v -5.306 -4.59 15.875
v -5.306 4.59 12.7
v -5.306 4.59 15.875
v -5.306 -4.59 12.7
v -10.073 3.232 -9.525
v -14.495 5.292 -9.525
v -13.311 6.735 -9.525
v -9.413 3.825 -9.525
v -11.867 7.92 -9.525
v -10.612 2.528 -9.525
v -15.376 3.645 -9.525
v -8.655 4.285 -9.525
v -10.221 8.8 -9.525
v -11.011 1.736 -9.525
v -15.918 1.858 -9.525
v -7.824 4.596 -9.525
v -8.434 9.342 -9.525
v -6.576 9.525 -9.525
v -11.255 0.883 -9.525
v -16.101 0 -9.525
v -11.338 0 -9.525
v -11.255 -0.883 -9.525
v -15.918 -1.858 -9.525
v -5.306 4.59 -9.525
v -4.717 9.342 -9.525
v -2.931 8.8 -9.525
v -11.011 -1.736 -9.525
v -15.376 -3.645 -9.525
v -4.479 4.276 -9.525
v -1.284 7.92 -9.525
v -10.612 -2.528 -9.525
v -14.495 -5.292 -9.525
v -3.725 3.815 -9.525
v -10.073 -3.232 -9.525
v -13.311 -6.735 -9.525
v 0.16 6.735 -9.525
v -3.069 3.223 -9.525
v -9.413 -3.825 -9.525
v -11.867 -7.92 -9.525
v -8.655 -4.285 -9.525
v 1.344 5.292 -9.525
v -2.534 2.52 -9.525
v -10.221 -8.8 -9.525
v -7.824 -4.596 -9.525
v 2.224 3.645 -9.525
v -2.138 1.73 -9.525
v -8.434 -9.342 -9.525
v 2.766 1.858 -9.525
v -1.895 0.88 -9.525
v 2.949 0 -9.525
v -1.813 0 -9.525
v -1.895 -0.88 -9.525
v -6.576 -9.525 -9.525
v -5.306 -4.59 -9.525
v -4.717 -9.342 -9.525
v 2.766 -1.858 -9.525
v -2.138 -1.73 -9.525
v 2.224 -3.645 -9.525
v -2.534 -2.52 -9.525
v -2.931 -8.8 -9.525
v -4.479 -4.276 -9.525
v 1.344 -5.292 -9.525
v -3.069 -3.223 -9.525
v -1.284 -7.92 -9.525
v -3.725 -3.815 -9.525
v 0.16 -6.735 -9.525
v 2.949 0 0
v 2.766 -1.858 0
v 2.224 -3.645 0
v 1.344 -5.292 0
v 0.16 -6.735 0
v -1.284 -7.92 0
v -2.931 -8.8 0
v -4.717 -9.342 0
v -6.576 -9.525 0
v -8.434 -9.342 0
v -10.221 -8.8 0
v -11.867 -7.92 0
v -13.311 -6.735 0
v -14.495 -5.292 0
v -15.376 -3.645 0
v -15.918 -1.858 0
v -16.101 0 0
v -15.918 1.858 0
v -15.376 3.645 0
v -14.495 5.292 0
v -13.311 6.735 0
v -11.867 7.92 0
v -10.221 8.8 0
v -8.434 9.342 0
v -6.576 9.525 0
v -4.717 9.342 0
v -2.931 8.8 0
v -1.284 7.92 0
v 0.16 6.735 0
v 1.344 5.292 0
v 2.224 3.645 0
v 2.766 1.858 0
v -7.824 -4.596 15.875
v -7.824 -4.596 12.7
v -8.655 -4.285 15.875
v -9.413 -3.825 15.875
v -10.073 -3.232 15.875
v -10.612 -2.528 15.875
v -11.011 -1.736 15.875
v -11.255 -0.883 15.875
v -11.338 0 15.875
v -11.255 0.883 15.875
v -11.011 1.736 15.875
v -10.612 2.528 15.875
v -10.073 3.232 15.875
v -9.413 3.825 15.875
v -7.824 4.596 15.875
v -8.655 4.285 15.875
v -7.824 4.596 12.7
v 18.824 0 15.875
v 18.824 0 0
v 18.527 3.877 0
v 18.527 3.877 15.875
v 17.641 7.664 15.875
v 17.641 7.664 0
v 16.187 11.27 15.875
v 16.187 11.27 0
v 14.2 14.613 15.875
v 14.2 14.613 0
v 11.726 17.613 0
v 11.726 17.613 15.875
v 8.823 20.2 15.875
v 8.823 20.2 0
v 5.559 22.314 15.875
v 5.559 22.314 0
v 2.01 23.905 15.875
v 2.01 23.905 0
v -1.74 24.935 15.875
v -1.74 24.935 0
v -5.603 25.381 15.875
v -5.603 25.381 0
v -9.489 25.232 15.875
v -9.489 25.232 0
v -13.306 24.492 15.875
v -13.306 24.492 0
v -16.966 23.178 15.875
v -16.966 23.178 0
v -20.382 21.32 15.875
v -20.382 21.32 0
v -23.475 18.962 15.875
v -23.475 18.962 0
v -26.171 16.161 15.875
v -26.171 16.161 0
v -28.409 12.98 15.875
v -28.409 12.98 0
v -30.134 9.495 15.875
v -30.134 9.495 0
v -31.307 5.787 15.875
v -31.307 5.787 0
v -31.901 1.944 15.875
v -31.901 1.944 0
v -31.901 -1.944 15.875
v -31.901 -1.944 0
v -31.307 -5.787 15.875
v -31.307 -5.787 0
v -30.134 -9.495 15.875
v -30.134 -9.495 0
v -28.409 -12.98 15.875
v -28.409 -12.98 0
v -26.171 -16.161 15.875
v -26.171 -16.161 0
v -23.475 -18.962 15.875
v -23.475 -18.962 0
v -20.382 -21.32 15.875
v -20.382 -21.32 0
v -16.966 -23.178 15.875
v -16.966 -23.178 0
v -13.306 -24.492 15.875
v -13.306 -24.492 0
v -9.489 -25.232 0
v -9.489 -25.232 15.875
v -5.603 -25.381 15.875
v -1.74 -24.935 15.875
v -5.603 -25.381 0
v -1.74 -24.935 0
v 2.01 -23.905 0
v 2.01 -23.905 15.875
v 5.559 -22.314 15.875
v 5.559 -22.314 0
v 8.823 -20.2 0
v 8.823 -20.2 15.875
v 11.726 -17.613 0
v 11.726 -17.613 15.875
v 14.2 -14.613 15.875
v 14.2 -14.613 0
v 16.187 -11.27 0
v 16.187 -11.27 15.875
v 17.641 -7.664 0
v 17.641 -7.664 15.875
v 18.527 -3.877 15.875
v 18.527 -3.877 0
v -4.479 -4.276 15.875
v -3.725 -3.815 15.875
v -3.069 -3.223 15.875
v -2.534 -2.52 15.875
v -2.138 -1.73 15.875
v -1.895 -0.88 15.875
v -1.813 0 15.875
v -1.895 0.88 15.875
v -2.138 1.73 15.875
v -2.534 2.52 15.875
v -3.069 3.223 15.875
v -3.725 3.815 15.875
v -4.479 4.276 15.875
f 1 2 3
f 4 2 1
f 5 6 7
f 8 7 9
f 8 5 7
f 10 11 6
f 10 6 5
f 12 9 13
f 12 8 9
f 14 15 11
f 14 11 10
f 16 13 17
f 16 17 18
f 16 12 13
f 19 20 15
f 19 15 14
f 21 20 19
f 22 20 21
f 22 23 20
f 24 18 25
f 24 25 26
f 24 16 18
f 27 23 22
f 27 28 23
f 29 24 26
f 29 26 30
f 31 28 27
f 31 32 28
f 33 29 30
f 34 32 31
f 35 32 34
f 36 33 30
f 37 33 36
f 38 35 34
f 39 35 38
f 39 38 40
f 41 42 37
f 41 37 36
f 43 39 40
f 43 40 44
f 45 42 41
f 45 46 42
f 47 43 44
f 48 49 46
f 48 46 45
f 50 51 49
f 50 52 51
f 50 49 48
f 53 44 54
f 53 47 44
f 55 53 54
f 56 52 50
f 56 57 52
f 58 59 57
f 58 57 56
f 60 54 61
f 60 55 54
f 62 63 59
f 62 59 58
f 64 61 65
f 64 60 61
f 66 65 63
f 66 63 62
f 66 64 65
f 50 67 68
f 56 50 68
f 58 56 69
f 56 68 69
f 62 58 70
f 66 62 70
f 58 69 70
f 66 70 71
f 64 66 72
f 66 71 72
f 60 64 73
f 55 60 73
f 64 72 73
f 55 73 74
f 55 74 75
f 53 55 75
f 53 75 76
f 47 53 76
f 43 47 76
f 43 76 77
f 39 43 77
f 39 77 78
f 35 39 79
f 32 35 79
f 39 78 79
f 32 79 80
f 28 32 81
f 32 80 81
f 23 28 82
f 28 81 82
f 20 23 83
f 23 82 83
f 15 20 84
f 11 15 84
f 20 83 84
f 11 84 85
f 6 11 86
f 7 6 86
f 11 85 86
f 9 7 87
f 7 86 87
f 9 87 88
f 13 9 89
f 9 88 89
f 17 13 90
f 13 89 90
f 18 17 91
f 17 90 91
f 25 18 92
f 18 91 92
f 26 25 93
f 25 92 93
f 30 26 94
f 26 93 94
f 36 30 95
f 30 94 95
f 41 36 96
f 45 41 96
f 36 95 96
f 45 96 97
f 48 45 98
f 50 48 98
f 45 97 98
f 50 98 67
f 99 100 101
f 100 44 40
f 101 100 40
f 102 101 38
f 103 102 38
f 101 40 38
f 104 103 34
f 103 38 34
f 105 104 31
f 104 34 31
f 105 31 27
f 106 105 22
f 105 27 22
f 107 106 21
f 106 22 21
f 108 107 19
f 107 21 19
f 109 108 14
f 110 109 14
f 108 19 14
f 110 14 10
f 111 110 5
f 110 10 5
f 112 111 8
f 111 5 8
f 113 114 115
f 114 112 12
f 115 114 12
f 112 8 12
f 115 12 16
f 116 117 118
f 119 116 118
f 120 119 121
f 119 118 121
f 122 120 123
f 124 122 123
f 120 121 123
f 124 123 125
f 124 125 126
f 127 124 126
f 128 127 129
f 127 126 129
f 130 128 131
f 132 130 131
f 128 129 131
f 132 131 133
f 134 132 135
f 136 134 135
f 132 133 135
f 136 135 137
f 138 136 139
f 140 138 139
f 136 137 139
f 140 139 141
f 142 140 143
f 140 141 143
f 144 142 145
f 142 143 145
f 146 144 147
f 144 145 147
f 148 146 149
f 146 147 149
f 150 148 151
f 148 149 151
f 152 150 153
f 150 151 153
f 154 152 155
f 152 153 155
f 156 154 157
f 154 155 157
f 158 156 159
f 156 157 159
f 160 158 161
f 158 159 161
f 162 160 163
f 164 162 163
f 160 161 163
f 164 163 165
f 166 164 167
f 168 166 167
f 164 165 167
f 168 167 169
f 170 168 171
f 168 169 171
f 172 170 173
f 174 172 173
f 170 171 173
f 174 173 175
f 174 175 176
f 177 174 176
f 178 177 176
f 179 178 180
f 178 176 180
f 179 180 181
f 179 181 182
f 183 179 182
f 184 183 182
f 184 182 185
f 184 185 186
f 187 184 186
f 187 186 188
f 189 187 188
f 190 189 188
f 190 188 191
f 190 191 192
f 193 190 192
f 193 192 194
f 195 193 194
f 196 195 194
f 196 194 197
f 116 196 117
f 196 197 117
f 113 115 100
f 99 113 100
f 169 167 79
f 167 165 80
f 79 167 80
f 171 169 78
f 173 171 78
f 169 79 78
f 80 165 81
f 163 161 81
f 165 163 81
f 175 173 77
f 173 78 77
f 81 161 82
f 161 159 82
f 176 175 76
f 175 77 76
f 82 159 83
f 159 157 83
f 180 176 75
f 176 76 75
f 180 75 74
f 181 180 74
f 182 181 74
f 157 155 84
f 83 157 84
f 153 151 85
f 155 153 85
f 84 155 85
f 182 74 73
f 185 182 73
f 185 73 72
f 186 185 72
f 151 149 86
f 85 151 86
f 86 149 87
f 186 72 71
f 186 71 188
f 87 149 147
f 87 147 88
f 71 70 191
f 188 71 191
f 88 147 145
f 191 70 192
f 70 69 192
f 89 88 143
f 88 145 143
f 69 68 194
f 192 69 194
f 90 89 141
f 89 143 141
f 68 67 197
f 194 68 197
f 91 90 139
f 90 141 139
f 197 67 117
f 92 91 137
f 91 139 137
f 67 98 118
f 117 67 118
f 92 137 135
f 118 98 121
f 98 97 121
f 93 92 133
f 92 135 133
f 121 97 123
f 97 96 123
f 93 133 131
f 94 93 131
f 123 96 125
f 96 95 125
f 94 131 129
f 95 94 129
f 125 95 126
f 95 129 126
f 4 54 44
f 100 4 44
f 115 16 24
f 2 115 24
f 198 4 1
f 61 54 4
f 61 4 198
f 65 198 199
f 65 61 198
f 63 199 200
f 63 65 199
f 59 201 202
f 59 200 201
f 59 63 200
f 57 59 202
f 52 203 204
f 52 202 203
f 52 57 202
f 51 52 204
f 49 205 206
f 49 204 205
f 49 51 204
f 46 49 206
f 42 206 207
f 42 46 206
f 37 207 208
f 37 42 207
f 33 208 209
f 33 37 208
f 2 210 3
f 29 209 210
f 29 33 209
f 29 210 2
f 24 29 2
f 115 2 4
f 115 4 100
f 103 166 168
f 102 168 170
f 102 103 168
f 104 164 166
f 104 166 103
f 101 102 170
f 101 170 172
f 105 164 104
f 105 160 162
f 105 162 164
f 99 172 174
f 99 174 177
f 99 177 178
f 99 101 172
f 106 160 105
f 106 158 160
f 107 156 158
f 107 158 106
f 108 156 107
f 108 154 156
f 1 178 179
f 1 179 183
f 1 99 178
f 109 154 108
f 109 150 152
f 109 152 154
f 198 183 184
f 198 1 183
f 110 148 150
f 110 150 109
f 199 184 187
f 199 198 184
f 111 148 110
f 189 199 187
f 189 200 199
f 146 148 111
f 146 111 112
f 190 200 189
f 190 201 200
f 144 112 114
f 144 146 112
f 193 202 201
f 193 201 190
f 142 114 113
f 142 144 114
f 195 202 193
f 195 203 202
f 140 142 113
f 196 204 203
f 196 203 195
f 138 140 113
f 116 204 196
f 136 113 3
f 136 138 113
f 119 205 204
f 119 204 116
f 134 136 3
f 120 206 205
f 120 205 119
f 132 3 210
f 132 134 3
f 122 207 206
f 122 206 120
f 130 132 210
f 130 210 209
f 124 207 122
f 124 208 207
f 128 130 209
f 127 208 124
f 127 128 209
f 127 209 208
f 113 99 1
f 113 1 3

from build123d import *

# Parameters (mm, degrees)
SKETCH1_R               = 25.4
BOSS_EXTRUDE1_DEPTH     = 15.875
SKETCH6_R               = 9.525
BOSS_EXTRUDE3_DEPTH     = 9.525
CUT_EXTRUDE3_DEPTH      = 49.09113031
CUT_EXTRUDE3_DEPTH_BACK = 49.09113031
CUT_EXTRUDE5_DEPTH      = 22.225


with BuildPart() as part:
    # Sketch1 → Boss-Extrude1 (new body)
    with BuildSketch(Plane.XY):
        with Locations((-6.575565897, 0)):
            Circle(SKETCH1_R)
    extrude(amount=BOSS_EXTRUDE1_DEPTH)

    # Sketch6 → Boss-Extrude3 (add)
    with BuildSketch(Plane(origin=(0, 0, 0), x_dir=(-1, 0, 0), z_dir=(0, 0, -1))):
        with Locations(Location((6.575565897, 0, 0), (0, 0, 180))):
            Circle(SKETCH6_R)
    extrude(amount=BOSS_EXTRUDE3_DEPTH)

    # Sketch2 → Cut-Extrude3 (cut, two sides: drawn at the far end of the back side and taken through both)
    with BuildSketch(Plane.XY.offset(15.875).offset(-CUT_EXTRUDE3_DEPTH_BACK)):
        with BuildLine():
            Line((-7.824241479, 4.595891159), (-7.824241479, -4.595891159))
            ThreePointArc((-7.824241479, -4.595891159), (-11.338065897, 0), (-7.824241479, 4.595891159))
        make_face()
        with BuildLine():
            Line((-5.305565897, 4.590044254), (-5.305565897, -4.590044254))
            ThreePointArc((-5.305565897, -4.590044254), (-1.813065897, 0), (-5.305565897, 4.590044254))
        make_face()
    extrude(amount=CUT_EXTRUDE3_DEPTH + CUT_EXTRUDE3_DEPTH_BACK, mode=Mode.SUBTRACT)

    # Sketch10 → Cut-Extrude5 (cut)
    with BuildSketch(Plane(origin=(0, 0, -9.525), x_dir=(-1, 0, 0), z_dir=(0, 0, -1))):
        Polygon((5.305565897, 4.590044254), (5.305565897, -4.590044254), (7.824241479, -4.595891159), (7.824241479, 4.595891159), align=None)
    extrude(amount=-CUT_EXTRUDE5_DEPTH, mode=Mode.SUBTRACT)


solid = part.part
